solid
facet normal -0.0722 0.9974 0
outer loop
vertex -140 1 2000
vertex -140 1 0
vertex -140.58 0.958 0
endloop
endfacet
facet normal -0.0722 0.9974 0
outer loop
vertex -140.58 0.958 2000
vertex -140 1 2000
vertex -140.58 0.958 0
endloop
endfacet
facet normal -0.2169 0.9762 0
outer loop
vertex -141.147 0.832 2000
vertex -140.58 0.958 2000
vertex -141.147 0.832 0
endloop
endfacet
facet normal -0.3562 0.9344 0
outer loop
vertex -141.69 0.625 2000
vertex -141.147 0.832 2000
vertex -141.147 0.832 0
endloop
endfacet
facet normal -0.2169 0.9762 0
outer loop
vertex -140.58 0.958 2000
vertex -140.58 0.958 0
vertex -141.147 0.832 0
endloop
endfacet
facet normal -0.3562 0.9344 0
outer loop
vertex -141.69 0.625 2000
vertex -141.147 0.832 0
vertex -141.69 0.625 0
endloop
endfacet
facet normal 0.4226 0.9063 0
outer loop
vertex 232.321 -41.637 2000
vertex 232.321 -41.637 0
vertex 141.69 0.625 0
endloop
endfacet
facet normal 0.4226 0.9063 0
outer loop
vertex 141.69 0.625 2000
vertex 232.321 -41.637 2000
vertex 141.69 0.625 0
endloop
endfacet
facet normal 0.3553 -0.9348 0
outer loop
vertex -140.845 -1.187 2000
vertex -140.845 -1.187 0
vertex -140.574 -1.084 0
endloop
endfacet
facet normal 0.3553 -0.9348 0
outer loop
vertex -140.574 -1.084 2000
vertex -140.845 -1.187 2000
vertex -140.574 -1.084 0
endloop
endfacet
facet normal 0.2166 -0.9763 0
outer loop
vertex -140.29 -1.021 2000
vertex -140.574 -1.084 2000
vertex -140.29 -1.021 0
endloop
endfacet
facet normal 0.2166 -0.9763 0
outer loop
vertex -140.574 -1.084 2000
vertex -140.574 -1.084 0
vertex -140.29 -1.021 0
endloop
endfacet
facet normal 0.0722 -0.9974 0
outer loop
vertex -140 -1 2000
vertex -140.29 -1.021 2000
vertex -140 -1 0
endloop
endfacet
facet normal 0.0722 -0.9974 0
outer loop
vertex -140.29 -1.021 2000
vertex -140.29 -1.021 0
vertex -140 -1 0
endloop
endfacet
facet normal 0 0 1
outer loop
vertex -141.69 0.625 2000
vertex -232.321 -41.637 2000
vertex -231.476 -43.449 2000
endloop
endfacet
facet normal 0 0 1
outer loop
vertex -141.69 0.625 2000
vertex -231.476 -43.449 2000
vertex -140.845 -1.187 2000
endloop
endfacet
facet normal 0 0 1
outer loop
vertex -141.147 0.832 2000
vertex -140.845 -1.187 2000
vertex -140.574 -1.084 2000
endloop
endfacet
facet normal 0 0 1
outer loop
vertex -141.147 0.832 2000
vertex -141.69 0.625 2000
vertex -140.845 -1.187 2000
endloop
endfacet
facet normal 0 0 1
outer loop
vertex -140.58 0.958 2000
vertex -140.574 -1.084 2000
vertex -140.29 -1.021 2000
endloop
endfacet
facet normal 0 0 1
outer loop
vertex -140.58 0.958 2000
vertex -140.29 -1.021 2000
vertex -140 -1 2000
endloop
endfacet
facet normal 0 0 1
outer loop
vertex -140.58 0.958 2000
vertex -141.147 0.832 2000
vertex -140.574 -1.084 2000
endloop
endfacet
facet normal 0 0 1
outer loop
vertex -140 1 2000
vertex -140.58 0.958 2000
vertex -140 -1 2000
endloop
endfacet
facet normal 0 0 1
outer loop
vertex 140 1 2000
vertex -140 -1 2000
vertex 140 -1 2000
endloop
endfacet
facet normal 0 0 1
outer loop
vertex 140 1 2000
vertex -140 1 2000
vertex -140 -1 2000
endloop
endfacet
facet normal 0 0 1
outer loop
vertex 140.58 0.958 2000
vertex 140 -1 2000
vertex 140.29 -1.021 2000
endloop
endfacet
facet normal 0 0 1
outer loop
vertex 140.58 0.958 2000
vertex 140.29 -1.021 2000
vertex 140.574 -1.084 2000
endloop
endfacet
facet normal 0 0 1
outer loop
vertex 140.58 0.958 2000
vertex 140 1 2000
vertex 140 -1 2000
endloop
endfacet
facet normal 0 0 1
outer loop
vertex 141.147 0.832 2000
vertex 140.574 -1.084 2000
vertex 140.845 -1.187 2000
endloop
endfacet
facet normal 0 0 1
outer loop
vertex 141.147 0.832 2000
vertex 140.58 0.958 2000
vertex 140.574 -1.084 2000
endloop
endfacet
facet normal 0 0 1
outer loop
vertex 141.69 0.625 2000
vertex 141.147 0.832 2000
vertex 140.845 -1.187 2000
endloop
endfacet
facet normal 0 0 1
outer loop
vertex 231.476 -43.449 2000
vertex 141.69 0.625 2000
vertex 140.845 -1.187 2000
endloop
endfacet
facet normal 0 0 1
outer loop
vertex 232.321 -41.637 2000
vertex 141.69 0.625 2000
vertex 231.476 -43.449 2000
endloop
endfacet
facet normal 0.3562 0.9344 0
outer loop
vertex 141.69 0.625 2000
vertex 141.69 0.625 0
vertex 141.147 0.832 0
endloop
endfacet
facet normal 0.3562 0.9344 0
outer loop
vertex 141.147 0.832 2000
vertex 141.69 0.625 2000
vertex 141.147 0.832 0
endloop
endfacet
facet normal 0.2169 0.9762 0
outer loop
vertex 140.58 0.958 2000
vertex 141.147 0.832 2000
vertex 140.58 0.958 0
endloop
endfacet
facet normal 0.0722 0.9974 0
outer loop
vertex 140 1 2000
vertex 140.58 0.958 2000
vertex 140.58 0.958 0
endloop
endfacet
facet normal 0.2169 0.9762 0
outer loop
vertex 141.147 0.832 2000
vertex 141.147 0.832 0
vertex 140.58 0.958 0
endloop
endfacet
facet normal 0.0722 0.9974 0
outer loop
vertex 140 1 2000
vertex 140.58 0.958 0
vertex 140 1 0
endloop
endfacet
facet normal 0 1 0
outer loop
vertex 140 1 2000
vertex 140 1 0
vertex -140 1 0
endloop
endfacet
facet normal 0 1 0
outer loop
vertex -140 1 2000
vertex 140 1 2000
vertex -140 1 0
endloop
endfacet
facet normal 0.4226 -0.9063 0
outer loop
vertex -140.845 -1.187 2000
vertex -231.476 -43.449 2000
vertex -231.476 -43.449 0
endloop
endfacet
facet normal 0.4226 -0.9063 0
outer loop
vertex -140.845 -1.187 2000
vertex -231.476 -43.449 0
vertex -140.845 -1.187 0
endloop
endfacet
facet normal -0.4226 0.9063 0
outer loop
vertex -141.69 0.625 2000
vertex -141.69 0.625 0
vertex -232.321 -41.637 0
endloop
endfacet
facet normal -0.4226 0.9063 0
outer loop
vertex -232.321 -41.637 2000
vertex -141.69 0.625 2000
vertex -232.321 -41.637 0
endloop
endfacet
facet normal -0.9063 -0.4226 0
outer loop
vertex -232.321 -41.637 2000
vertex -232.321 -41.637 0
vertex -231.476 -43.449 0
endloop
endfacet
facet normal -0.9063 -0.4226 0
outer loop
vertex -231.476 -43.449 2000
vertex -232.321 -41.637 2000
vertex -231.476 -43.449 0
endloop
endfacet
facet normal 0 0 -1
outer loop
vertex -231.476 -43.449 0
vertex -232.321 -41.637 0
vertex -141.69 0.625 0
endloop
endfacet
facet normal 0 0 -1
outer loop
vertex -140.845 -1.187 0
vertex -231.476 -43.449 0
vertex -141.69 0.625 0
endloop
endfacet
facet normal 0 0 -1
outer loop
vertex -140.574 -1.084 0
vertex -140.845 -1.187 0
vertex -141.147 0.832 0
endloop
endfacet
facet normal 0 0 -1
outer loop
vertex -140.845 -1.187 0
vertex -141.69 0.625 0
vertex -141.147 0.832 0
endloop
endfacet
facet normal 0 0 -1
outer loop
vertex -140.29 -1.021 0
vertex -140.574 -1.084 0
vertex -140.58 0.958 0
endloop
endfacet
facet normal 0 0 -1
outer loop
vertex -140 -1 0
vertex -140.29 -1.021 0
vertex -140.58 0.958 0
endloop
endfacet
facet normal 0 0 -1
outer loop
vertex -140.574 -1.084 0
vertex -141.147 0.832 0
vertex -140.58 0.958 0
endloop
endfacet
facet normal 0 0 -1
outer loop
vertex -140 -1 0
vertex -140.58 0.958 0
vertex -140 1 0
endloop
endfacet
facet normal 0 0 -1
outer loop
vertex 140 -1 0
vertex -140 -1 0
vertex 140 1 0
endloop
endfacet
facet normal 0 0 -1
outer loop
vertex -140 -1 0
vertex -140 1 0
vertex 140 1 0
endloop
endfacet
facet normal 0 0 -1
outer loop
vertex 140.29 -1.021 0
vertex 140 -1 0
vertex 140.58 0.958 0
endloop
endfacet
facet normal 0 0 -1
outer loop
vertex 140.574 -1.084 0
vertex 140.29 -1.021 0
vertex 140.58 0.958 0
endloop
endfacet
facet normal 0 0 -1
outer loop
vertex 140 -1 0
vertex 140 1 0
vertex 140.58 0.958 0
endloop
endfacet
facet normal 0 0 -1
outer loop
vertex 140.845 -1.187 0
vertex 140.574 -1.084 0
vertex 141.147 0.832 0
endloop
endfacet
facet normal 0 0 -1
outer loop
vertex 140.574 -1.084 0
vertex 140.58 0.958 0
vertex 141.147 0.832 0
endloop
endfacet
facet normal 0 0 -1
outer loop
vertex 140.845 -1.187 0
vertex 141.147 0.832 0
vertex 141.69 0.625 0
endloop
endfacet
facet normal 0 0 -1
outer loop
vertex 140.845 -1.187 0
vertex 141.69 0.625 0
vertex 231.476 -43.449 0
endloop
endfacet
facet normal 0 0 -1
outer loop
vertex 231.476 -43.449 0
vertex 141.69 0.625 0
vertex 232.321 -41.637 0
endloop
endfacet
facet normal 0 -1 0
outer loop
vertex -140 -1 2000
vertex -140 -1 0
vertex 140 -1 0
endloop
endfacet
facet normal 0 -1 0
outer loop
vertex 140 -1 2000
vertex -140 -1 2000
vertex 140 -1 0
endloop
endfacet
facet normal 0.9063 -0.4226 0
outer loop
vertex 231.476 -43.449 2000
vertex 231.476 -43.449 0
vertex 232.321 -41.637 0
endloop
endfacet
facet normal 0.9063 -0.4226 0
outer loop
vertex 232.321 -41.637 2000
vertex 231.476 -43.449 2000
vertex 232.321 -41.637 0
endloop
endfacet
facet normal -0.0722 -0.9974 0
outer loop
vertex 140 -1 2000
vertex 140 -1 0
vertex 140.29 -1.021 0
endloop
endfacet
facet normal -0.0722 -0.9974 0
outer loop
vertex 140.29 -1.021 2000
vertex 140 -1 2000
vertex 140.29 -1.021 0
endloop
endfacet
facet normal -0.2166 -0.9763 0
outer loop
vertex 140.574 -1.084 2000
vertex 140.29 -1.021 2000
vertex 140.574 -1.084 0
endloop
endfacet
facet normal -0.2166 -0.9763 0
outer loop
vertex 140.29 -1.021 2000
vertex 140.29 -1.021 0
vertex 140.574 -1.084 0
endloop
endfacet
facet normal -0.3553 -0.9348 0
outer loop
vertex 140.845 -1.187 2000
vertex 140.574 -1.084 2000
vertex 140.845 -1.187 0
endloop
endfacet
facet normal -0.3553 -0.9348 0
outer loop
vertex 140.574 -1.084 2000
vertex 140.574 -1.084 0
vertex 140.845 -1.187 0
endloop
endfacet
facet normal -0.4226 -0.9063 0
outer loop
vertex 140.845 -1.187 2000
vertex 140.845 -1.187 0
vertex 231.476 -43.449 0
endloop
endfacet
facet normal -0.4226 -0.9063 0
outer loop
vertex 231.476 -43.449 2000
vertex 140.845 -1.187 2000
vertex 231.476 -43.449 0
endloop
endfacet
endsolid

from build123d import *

# Parameters (mm, degrees)
F1_DEPTH = 2000


with BuildPart() as f1:
    # F0 (on Top) → F1 (new body)
    with BuildSketch(Plane.XY):
        with BuildLine():
            Line((140, 1), (0, 1))
            Line((0, 1), (-140, 1))
            ThreePointArc((-140, 1), (-140.865758, 0.905184), (-141.690473, 0.625231))
            Line((-141.690473, 0.625231), (-232.321252, -41.636595))
            Line((-232.321252, -41.636595), (-231.476015, -43.449211))
            Line((-231.476015, -43.449211), (-140.845237, -1.187384))
            ThreePointArc((-140.845237, -1.187384), (-140.432879, -1.047408), (-140, -1))
            Line((-140, -1), (0, -1))
            Line((0, -1), (140, -1))
            ThreePointArc((140, -1), (140.432879, -1.047408), (140.845237, -1.187384))
            Line((140.845237, -1.187384), (231.476015, -43.449211))
            Line((231.476015, -43.449211), (232.321252, -41.636595))
            Line((232.321252, -41.636595), (141.690473, 0.625231))
            ThreePointArc((141.690473, 0.625231), (140.865758, 0.905184), (140, 1))
        make_face()
    extrude(amount=F1_DEPTH)


solid = f1.part
